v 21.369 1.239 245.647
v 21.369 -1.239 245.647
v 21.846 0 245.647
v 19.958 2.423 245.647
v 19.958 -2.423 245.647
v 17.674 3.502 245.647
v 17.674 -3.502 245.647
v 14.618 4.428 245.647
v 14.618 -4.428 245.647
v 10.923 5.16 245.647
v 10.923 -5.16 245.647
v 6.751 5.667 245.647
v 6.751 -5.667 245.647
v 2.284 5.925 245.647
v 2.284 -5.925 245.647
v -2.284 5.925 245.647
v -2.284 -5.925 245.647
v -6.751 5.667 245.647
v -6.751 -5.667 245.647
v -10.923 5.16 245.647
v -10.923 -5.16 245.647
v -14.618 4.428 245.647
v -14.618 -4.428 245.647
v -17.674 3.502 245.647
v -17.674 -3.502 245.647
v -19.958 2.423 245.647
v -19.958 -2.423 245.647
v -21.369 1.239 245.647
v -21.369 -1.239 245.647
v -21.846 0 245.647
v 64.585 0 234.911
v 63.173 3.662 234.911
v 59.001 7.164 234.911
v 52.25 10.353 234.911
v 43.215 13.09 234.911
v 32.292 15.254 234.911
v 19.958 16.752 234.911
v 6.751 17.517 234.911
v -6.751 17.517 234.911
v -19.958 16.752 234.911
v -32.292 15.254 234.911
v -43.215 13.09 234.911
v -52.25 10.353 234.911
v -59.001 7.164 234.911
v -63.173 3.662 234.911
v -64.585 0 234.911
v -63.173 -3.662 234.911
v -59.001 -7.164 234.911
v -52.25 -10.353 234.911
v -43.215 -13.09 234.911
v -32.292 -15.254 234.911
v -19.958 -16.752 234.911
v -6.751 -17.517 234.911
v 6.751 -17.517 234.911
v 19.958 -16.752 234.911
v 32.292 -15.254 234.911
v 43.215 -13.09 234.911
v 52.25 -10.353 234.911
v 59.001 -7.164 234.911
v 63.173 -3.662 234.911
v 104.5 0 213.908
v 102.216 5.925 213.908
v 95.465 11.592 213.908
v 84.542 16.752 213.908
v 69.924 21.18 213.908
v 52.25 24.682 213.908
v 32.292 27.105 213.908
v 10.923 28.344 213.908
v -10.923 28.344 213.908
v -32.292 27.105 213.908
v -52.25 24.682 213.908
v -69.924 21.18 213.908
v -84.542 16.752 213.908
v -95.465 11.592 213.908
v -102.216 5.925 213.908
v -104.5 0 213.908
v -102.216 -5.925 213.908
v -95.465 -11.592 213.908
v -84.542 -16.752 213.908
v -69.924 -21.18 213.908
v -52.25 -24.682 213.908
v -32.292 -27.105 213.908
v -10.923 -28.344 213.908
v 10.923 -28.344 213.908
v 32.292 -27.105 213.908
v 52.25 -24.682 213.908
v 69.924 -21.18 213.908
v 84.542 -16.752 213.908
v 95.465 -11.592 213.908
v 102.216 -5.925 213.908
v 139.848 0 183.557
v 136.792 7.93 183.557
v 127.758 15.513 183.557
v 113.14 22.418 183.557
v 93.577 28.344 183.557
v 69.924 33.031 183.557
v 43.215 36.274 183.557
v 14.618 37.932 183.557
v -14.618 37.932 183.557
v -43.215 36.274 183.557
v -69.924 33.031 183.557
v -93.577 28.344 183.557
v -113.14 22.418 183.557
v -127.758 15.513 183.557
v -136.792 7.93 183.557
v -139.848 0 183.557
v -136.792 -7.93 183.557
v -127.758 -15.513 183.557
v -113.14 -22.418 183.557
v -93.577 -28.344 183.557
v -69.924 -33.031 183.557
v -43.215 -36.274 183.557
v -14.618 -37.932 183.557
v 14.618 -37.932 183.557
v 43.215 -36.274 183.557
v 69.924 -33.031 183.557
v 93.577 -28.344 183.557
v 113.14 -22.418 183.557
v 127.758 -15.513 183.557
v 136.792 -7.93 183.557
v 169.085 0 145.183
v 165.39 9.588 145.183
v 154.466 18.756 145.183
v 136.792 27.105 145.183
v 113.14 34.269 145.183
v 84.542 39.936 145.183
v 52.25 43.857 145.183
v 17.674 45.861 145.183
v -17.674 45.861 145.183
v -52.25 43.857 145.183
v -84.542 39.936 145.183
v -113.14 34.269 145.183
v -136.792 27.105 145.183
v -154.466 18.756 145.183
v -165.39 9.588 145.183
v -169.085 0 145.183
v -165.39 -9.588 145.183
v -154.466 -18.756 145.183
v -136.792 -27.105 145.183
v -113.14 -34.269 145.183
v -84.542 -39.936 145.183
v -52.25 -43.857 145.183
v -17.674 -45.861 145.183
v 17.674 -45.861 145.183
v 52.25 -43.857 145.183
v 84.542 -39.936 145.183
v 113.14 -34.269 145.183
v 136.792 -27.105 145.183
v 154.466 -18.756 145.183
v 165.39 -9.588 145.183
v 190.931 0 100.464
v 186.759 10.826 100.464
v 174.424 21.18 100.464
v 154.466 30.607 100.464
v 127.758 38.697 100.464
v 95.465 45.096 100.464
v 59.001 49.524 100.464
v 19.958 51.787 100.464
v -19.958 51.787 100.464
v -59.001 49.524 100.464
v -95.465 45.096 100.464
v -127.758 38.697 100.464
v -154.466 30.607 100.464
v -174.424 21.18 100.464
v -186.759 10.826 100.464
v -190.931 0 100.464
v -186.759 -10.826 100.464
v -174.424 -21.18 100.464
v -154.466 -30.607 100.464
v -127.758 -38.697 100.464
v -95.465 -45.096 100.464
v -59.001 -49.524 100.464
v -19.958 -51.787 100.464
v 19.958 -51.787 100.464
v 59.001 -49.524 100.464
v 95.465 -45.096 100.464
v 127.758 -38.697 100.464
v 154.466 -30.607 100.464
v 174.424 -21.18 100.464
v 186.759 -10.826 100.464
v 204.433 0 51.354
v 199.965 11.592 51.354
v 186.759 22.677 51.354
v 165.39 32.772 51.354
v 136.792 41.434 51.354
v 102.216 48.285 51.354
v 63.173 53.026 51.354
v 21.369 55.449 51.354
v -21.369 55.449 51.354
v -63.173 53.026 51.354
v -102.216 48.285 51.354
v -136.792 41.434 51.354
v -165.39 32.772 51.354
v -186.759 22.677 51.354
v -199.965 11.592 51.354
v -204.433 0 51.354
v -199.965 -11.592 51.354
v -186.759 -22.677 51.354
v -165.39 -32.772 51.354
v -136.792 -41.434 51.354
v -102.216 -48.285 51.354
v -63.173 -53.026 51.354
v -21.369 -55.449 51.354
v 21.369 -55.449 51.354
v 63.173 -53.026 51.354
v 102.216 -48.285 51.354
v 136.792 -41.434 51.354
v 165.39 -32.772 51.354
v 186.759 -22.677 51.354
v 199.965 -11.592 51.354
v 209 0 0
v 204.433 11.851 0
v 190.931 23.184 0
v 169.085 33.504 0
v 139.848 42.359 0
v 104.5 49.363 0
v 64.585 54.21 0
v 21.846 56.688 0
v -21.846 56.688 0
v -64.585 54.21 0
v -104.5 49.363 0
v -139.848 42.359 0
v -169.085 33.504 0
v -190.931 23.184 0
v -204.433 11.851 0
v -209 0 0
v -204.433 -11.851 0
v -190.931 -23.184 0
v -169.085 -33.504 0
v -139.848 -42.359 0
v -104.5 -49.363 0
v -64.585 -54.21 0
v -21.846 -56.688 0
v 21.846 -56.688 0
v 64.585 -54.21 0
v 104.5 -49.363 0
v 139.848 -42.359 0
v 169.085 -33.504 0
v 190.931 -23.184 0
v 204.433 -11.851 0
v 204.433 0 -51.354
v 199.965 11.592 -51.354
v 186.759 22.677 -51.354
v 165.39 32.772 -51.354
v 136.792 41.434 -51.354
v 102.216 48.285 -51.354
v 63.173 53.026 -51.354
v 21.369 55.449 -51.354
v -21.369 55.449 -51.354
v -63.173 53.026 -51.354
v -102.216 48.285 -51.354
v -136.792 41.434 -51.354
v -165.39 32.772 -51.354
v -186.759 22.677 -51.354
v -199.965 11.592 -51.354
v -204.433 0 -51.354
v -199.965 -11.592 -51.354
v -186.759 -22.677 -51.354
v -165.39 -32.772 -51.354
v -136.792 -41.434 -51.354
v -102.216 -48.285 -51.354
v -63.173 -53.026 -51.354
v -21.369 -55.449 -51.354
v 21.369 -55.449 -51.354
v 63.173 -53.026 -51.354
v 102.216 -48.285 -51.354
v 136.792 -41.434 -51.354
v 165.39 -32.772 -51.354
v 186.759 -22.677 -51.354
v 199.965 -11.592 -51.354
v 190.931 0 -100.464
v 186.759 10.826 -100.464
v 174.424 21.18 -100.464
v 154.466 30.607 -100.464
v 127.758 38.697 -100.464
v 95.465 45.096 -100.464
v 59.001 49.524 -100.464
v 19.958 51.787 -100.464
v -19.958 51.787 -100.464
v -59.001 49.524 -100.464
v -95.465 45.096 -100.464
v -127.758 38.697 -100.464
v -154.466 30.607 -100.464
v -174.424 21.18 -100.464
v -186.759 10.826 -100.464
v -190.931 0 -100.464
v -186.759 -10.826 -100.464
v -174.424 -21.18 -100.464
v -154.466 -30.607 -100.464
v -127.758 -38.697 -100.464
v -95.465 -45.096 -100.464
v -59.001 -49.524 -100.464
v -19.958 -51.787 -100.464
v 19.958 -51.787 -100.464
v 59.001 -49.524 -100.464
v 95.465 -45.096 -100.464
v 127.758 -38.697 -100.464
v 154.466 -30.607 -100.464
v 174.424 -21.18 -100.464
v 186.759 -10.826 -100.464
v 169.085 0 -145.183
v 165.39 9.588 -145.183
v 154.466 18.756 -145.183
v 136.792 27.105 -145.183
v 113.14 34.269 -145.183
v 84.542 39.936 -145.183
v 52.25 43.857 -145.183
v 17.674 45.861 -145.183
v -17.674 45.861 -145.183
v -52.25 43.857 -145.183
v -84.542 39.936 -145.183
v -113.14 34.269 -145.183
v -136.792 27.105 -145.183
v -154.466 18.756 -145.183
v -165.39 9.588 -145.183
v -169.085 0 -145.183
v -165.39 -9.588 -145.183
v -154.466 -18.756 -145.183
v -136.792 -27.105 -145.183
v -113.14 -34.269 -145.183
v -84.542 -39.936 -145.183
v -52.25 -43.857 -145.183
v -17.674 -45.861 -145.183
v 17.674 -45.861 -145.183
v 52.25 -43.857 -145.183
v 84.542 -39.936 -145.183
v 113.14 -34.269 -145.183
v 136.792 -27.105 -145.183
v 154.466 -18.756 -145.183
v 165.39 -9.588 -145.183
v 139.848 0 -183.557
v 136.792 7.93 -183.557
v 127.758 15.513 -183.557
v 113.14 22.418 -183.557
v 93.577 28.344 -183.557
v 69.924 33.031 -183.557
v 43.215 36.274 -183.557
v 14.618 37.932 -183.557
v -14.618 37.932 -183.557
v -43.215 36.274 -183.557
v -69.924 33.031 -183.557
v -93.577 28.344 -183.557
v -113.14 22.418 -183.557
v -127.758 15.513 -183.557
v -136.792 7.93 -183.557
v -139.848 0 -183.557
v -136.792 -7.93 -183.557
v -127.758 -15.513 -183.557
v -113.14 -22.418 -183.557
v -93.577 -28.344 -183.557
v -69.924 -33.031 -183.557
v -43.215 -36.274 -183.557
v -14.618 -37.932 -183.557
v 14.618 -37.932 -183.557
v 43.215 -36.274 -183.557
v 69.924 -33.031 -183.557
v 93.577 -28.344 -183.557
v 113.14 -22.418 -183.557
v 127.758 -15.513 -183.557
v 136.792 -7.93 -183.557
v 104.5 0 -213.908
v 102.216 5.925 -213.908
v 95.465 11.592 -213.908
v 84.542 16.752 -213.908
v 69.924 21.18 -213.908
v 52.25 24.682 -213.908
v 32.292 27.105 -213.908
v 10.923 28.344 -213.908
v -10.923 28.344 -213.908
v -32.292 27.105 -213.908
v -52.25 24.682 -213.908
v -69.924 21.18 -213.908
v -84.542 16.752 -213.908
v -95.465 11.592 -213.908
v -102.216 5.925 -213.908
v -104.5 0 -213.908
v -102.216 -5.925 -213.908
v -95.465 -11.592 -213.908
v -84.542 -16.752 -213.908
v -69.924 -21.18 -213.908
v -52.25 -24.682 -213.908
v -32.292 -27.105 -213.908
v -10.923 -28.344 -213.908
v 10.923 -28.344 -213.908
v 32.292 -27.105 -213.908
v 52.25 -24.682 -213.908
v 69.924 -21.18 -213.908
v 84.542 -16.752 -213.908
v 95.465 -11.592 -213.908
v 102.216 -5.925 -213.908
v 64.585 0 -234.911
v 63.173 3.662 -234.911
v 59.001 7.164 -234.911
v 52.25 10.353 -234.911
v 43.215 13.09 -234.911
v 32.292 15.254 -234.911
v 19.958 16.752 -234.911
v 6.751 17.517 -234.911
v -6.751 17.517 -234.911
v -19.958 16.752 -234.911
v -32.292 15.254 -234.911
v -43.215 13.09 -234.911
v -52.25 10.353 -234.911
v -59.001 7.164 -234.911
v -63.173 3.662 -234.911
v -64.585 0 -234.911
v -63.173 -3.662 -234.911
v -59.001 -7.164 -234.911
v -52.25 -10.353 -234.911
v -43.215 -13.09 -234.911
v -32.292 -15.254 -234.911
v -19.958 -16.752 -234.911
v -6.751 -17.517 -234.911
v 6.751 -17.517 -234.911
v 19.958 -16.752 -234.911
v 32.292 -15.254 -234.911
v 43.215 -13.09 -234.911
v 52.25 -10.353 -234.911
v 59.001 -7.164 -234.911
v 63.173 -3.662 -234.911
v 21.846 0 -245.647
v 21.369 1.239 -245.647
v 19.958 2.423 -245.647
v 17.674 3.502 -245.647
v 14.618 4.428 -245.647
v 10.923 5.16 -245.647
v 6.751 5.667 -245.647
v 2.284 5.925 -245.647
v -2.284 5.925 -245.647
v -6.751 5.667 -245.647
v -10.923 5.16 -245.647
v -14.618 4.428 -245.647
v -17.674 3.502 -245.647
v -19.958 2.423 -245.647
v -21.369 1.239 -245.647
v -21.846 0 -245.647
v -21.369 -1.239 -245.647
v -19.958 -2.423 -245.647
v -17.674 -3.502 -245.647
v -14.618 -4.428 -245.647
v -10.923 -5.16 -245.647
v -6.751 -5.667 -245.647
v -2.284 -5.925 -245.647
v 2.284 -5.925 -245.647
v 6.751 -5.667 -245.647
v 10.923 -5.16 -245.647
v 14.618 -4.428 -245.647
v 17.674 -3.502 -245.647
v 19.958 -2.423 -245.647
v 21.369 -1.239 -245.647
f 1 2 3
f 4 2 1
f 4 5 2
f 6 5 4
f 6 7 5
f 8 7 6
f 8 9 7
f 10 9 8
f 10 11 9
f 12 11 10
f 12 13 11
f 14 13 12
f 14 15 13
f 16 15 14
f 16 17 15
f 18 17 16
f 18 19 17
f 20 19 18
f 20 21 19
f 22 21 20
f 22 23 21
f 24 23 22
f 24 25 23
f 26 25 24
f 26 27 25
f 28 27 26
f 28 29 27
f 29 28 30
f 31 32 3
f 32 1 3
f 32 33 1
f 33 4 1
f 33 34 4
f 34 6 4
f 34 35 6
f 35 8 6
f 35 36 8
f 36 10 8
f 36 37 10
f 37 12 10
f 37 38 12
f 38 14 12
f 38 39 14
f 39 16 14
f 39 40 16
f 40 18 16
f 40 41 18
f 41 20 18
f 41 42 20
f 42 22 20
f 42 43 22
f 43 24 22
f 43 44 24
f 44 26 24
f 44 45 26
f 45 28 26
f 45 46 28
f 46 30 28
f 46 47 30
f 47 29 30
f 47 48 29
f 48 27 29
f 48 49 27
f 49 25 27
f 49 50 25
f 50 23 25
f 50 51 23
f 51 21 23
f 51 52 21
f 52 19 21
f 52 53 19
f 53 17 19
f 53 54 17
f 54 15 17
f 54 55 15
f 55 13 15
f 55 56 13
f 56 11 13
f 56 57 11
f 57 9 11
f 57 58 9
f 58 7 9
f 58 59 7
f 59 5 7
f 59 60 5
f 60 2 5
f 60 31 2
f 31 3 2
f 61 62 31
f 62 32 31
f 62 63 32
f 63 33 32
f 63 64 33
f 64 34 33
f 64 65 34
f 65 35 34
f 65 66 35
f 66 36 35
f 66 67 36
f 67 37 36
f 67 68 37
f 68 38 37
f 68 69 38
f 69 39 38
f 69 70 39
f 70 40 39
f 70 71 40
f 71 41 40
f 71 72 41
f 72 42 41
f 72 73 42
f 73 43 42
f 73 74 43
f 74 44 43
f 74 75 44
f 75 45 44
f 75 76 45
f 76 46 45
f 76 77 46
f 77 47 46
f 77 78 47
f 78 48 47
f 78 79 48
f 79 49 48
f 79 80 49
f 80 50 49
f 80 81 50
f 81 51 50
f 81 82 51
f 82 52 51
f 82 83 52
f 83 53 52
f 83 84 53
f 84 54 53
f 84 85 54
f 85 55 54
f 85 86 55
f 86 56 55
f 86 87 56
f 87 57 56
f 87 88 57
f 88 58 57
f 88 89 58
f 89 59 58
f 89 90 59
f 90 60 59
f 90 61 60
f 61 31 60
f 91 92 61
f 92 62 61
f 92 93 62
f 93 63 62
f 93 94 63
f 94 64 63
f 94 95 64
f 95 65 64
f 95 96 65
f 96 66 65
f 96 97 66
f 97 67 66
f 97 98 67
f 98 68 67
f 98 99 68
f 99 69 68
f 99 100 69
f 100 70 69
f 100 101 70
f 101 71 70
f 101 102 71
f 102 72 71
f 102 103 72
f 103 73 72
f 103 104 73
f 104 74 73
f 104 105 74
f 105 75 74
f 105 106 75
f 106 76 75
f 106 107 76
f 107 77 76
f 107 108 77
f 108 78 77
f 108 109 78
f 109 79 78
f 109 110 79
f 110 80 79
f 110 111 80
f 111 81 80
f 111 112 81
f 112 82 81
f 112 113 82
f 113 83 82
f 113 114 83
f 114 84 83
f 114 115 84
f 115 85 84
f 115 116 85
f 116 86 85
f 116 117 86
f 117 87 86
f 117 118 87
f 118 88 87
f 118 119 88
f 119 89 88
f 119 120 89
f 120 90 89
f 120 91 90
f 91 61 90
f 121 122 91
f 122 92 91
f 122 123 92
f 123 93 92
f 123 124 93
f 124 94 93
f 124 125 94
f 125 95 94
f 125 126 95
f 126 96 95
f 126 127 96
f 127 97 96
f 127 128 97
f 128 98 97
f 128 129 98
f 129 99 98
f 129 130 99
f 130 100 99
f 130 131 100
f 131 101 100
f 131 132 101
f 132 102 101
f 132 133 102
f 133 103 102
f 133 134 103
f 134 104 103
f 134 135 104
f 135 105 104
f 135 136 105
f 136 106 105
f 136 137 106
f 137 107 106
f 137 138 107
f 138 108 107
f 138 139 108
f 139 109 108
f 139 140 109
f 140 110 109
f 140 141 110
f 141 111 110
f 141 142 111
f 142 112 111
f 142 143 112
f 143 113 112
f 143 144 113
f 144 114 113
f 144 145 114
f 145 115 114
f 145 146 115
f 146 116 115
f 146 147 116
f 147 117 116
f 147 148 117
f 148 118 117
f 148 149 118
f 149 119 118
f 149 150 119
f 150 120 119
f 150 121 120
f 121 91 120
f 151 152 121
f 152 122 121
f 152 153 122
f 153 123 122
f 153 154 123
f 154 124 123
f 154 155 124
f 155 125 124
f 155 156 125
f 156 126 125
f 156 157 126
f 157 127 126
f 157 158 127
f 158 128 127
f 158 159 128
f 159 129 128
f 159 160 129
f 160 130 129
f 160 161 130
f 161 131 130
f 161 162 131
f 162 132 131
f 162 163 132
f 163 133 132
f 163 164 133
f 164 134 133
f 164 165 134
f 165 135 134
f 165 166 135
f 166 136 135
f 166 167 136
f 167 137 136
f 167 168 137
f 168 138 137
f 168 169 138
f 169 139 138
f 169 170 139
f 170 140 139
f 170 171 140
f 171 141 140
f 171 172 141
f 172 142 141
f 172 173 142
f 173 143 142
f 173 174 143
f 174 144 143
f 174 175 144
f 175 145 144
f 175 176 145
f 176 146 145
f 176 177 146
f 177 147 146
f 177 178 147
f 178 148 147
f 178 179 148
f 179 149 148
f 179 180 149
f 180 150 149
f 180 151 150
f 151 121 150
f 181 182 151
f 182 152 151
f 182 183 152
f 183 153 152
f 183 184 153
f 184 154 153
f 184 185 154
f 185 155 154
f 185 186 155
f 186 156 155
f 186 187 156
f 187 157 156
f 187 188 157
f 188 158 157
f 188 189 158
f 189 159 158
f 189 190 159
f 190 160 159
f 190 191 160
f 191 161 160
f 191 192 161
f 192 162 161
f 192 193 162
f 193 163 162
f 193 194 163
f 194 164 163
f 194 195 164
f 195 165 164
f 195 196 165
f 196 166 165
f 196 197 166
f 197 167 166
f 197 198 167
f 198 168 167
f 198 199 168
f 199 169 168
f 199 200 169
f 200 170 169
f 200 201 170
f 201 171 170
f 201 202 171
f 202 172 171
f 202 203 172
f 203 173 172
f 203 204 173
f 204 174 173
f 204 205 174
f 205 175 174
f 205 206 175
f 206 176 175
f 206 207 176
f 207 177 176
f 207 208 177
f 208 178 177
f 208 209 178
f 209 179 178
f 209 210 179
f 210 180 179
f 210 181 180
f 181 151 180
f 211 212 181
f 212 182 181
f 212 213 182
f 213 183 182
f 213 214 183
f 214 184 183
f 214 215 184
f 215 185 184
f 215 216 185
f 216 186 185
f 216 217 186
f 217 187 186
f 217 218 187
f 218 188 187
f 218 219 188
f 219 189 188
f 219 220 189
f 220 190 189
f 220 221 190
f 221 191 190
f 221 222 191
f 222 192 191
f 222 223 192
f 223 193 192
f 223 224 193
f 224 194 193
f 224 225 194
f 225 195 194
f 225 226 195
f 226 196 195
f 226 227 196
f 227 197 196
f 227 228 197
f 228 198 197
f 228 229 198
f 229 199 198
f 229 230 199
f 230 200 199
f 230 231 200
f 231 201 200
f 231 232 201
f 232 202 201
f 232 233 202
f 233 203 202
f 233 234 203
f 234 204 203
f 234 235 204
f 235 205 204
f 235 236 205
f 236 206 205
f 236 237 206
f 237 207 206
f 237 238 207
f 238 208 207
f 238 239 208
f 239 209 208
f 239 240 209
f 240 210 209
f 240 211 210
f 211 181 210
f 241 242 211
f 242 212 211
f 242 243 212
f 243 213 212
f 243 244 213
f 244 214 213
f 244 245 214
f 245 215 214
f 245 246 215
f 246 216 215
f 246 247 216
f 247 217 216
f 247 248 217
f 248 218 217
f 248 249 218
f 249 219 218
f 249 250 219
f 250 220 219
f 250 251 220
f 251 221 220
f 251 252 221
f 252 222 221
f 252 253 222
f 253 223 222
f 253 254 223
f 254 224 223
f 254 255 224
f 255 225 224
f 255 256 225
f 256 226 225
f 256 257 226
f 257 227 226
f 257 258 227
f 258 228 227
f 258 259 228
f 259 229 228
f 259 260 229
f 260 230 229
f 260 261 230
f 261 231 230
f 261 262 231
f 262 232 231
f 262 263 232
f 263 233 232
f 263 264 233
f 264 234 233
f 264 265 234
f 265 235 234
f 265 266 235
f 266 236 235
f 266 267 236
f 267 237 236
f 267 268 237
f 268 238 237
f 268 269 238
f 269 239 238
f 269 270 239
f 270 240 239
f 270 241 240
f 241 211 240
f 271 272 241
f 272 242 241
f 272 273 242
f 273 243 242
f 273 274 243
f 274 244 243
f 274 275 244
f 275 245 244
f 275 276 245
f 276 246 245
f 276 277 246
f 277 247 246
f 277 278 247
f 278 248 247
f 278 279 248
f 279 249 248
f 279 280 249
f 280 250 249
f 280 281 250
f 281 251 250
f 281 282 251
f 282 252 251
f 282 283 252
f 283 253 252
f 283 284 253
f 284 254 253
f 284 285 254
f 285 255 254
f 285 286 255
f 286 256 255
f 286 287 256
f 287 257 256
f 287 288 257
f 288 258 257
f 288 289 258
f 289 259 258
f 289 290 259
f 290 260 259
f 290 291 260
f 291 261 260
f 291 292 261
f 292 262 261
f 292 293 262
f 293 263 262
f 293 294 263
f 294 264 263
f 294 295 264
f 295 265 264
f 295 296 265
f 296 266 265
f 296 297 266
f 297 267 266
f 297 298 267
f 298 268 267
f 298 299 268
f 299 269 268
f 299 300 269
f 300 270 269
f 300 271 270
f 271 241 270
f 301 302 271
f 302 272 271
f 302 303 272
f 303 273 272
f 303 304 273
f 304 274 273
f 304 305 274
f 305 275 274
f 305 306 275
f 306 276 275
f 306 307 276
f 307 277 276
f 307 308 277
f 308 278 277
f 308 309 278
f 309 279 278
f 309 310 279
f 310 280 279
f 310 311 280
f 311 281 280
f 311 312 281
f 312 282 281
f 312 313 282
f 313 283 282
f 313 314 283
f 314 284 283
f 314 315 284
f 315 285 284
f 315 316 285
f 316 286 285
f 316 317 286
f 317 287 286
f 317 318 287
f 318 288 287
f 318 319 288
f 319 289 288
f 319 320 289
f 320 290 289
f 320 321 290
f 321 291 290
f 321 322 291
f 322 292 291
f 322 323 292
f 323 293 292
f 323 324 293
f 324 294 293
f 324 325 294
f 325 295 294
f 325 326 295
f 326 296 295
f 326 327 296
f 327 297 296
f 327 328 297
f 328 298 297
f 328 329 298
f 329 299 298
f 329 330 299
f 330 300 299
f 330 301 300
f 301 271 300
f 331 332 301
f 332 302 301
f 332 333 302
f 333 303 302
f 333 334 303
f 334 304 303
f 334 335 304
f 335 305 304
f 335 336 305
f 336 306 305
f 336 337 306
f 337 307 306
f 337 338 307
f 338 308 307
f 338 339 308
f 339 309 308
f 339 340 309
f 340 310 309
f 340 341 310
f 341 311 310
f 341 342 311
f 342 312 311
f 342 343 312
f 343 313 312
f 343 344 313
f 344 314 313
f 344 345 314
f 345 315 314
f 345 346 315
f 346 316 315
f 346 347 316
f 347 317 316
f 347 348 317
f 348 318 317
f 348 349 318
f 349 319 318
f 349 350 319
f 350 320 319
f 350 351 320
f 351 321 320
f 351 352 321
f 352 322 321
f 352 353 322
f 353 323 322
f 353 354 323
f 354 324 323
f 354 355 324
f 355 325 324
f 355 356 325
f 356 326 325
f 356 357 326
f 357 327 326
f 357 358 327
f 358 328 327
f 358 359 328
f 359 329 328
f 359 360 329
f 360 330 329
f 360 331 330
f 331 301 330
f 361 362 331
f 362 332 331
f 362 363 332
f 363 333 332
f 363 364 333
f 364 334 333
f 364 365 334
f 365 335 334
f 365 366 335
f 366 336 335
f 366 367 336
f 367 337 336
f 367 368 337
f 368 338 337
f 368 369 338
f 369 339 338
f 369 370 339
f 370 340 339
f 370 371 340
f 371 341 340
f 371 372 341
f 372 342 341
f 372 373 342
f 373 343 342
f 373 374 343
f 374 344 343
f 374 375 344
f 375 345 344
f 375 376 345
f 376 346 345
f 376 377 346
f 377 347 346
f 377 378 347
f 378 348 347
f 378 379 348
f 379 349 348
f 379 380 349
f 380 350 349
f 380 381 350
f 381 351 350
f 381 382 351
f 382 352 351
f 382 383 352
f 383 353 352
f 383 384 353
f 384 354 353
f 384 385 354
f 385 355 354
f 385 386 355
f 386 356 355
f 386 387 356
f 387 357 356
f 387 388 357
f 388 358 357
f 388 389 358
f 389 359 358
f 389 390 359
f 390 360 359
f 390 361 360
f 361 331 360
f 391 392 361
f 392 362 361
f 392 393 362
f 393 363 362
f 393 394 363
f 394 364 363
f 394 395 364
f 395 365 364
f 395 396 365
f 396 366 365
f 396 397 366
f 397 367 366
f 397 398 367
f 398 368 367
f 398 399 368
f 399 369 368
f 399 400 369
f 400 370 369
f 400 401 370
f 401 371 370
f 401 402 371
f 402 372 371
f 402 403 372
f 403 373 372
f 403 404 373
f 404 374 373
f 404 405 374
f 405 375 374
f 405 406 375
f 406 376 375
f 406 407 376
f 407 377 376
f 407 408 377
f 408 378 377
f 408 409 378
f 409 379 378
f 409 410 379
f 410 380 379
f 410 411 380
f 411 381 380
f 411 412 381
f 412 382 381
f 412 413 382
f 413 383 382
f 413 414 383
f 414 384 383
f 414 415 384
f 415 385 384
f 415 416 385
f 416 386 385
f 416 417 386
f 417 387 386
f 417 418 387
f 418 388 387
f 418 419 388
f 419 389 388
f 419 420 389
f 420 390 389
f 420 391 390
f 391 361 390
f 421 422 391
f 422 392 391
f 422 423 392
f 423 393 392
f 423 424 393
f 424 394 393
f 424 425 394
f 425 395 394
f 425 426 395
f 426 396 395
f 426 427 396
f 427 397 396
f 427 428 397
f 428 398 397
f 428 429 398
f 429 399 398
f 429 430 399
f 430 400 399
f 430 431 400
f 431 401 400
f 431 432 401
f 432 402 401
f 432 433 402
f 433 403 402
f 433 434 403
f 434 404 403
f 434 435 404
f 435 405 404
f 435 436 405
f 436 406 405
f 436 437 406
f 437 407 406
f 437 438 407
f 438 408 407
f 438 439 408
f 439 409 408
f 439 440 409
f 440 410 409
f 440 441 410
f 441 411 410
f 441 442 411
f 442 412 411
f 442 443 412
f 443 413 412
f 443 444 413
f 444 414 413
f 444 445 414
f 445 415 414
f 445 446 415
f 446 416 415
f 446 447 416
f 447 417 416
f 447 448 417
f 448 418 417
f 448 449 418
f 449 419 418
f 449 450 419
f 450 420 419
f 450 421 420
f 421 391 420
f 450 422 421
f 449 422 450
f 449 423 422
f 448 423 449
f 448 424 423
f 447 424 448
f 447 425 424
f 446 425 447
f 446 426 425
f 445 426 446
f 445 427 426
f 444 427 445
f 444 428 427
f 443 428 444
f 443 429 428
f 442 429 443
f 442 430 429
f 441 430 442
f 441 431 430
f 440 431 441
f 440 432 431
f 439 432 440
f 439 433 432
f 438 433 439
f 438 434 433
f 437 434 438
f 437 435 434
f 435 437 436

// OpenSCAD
// Generated by SolidPython 1.0.1 on 2020-07-29 00:46:49


scale(v = [11, 3, 13]) {
	sphere(r = 19);
}
/***********************************************
*********      SolidPython code:      **********
************************************************
 
# import packages: SolidPython
from solid import *
from solid.utils import *
from itertools import chain, combinations, permutations


class Resize:

    def __init__(self, scad_file):
        self.scad_file = scad_file
        #self.scad_file = import_scad(scad_file)
        # cone/cylinder param:
        self.r1 = 0
        self.r2 = 0
        self.h = 0
        # rectangular prism param:
        self.w = 0
        self.l = 0
        # ellipse param:
        self.r = 0

    # import OpenScad code (file name corresponds to shape)


    # classify shape + parameters
    def assign(self, param1, param2, param3):
        if self.scad_file == 'cone.scad':
            self.r1 = param1
            self.r2 = param2
            self.h = param3
        elif self.scad_file == 'cylinder.scad':
            self.r1 = param1
            self.r2 = param2
            self.h = param3
        elif self.scad_file == 'rectangularPrism.scad':
            self.h = param1
            self.l = param2
            self.w = param3
        else:
            self.r = param1
            self.h = param2

    # resize parameters
    def iterate(self):
        x = range(3, 20, 2)
        i = 1
        if self.scad_file == 'cone.scad':
            tempList = list(permutations(x, 2))
            for temp in tempList:
                param1 = temp[0]
                param2 = temp[1]
                filepath = 'produced_scad_files/' + 'cone' + str(param1) + '_' + str(param2) + '_' + '.scad'
                scad_render_to_file(cylinder(h=param1, r1=param2, r2=0), filepath)

        elif self.scad_file == 'cylinder.scad':
            tempList = list(permutations(x, 3))
            for temp in tempList:
                param1 = temp[0]
                param2 = temp[1]
                filepath = 'produced_scad_files/' + 'cylinder' + str(param1) + '_' + str(param2) + '_' + '.scad'
                scad_render_to_file(cylinder(h=param1, r1=param2, r2=param2), filepath)

        elif self.scad_file == 'rectangularPrism.scad':
            tempList = list(permutations(x, 3))
            for temp in tempList:
                param1 = temp[0]
                param2 = temp[1]
                param3 = temp[2]
                filepath = 'produced_scad_files/' + 'rectangularPrism' + str(param1) + '_' + str(param2) + '_' + str(
                    param3) + '.scad'
                scad_render_to_file(cube(size=(param1, param2, param3)), filepath)

        elif self.scad_file == 'ellipse.scad':
            tempList = list(permutations(x, 4))
            for temp in tempList:
                param1 = temp[0]
                param2 = temp[1]
                param3 = temp[2]
                param4 = temp[3]
                filepath = 'produced_scad_files/' + 'ellipse' + str(param1) + '_' + str(param2) + '_' + str(param3) + '_' + str(param4) + '.scad'
                scad_render_to_file(scale([param1, param2, param3])(sphere(r=param4)), filepath)

    def render_to_scadfile(self):
        scad_render_to_file(scad, 'example.scad') 
 
************************************************/
